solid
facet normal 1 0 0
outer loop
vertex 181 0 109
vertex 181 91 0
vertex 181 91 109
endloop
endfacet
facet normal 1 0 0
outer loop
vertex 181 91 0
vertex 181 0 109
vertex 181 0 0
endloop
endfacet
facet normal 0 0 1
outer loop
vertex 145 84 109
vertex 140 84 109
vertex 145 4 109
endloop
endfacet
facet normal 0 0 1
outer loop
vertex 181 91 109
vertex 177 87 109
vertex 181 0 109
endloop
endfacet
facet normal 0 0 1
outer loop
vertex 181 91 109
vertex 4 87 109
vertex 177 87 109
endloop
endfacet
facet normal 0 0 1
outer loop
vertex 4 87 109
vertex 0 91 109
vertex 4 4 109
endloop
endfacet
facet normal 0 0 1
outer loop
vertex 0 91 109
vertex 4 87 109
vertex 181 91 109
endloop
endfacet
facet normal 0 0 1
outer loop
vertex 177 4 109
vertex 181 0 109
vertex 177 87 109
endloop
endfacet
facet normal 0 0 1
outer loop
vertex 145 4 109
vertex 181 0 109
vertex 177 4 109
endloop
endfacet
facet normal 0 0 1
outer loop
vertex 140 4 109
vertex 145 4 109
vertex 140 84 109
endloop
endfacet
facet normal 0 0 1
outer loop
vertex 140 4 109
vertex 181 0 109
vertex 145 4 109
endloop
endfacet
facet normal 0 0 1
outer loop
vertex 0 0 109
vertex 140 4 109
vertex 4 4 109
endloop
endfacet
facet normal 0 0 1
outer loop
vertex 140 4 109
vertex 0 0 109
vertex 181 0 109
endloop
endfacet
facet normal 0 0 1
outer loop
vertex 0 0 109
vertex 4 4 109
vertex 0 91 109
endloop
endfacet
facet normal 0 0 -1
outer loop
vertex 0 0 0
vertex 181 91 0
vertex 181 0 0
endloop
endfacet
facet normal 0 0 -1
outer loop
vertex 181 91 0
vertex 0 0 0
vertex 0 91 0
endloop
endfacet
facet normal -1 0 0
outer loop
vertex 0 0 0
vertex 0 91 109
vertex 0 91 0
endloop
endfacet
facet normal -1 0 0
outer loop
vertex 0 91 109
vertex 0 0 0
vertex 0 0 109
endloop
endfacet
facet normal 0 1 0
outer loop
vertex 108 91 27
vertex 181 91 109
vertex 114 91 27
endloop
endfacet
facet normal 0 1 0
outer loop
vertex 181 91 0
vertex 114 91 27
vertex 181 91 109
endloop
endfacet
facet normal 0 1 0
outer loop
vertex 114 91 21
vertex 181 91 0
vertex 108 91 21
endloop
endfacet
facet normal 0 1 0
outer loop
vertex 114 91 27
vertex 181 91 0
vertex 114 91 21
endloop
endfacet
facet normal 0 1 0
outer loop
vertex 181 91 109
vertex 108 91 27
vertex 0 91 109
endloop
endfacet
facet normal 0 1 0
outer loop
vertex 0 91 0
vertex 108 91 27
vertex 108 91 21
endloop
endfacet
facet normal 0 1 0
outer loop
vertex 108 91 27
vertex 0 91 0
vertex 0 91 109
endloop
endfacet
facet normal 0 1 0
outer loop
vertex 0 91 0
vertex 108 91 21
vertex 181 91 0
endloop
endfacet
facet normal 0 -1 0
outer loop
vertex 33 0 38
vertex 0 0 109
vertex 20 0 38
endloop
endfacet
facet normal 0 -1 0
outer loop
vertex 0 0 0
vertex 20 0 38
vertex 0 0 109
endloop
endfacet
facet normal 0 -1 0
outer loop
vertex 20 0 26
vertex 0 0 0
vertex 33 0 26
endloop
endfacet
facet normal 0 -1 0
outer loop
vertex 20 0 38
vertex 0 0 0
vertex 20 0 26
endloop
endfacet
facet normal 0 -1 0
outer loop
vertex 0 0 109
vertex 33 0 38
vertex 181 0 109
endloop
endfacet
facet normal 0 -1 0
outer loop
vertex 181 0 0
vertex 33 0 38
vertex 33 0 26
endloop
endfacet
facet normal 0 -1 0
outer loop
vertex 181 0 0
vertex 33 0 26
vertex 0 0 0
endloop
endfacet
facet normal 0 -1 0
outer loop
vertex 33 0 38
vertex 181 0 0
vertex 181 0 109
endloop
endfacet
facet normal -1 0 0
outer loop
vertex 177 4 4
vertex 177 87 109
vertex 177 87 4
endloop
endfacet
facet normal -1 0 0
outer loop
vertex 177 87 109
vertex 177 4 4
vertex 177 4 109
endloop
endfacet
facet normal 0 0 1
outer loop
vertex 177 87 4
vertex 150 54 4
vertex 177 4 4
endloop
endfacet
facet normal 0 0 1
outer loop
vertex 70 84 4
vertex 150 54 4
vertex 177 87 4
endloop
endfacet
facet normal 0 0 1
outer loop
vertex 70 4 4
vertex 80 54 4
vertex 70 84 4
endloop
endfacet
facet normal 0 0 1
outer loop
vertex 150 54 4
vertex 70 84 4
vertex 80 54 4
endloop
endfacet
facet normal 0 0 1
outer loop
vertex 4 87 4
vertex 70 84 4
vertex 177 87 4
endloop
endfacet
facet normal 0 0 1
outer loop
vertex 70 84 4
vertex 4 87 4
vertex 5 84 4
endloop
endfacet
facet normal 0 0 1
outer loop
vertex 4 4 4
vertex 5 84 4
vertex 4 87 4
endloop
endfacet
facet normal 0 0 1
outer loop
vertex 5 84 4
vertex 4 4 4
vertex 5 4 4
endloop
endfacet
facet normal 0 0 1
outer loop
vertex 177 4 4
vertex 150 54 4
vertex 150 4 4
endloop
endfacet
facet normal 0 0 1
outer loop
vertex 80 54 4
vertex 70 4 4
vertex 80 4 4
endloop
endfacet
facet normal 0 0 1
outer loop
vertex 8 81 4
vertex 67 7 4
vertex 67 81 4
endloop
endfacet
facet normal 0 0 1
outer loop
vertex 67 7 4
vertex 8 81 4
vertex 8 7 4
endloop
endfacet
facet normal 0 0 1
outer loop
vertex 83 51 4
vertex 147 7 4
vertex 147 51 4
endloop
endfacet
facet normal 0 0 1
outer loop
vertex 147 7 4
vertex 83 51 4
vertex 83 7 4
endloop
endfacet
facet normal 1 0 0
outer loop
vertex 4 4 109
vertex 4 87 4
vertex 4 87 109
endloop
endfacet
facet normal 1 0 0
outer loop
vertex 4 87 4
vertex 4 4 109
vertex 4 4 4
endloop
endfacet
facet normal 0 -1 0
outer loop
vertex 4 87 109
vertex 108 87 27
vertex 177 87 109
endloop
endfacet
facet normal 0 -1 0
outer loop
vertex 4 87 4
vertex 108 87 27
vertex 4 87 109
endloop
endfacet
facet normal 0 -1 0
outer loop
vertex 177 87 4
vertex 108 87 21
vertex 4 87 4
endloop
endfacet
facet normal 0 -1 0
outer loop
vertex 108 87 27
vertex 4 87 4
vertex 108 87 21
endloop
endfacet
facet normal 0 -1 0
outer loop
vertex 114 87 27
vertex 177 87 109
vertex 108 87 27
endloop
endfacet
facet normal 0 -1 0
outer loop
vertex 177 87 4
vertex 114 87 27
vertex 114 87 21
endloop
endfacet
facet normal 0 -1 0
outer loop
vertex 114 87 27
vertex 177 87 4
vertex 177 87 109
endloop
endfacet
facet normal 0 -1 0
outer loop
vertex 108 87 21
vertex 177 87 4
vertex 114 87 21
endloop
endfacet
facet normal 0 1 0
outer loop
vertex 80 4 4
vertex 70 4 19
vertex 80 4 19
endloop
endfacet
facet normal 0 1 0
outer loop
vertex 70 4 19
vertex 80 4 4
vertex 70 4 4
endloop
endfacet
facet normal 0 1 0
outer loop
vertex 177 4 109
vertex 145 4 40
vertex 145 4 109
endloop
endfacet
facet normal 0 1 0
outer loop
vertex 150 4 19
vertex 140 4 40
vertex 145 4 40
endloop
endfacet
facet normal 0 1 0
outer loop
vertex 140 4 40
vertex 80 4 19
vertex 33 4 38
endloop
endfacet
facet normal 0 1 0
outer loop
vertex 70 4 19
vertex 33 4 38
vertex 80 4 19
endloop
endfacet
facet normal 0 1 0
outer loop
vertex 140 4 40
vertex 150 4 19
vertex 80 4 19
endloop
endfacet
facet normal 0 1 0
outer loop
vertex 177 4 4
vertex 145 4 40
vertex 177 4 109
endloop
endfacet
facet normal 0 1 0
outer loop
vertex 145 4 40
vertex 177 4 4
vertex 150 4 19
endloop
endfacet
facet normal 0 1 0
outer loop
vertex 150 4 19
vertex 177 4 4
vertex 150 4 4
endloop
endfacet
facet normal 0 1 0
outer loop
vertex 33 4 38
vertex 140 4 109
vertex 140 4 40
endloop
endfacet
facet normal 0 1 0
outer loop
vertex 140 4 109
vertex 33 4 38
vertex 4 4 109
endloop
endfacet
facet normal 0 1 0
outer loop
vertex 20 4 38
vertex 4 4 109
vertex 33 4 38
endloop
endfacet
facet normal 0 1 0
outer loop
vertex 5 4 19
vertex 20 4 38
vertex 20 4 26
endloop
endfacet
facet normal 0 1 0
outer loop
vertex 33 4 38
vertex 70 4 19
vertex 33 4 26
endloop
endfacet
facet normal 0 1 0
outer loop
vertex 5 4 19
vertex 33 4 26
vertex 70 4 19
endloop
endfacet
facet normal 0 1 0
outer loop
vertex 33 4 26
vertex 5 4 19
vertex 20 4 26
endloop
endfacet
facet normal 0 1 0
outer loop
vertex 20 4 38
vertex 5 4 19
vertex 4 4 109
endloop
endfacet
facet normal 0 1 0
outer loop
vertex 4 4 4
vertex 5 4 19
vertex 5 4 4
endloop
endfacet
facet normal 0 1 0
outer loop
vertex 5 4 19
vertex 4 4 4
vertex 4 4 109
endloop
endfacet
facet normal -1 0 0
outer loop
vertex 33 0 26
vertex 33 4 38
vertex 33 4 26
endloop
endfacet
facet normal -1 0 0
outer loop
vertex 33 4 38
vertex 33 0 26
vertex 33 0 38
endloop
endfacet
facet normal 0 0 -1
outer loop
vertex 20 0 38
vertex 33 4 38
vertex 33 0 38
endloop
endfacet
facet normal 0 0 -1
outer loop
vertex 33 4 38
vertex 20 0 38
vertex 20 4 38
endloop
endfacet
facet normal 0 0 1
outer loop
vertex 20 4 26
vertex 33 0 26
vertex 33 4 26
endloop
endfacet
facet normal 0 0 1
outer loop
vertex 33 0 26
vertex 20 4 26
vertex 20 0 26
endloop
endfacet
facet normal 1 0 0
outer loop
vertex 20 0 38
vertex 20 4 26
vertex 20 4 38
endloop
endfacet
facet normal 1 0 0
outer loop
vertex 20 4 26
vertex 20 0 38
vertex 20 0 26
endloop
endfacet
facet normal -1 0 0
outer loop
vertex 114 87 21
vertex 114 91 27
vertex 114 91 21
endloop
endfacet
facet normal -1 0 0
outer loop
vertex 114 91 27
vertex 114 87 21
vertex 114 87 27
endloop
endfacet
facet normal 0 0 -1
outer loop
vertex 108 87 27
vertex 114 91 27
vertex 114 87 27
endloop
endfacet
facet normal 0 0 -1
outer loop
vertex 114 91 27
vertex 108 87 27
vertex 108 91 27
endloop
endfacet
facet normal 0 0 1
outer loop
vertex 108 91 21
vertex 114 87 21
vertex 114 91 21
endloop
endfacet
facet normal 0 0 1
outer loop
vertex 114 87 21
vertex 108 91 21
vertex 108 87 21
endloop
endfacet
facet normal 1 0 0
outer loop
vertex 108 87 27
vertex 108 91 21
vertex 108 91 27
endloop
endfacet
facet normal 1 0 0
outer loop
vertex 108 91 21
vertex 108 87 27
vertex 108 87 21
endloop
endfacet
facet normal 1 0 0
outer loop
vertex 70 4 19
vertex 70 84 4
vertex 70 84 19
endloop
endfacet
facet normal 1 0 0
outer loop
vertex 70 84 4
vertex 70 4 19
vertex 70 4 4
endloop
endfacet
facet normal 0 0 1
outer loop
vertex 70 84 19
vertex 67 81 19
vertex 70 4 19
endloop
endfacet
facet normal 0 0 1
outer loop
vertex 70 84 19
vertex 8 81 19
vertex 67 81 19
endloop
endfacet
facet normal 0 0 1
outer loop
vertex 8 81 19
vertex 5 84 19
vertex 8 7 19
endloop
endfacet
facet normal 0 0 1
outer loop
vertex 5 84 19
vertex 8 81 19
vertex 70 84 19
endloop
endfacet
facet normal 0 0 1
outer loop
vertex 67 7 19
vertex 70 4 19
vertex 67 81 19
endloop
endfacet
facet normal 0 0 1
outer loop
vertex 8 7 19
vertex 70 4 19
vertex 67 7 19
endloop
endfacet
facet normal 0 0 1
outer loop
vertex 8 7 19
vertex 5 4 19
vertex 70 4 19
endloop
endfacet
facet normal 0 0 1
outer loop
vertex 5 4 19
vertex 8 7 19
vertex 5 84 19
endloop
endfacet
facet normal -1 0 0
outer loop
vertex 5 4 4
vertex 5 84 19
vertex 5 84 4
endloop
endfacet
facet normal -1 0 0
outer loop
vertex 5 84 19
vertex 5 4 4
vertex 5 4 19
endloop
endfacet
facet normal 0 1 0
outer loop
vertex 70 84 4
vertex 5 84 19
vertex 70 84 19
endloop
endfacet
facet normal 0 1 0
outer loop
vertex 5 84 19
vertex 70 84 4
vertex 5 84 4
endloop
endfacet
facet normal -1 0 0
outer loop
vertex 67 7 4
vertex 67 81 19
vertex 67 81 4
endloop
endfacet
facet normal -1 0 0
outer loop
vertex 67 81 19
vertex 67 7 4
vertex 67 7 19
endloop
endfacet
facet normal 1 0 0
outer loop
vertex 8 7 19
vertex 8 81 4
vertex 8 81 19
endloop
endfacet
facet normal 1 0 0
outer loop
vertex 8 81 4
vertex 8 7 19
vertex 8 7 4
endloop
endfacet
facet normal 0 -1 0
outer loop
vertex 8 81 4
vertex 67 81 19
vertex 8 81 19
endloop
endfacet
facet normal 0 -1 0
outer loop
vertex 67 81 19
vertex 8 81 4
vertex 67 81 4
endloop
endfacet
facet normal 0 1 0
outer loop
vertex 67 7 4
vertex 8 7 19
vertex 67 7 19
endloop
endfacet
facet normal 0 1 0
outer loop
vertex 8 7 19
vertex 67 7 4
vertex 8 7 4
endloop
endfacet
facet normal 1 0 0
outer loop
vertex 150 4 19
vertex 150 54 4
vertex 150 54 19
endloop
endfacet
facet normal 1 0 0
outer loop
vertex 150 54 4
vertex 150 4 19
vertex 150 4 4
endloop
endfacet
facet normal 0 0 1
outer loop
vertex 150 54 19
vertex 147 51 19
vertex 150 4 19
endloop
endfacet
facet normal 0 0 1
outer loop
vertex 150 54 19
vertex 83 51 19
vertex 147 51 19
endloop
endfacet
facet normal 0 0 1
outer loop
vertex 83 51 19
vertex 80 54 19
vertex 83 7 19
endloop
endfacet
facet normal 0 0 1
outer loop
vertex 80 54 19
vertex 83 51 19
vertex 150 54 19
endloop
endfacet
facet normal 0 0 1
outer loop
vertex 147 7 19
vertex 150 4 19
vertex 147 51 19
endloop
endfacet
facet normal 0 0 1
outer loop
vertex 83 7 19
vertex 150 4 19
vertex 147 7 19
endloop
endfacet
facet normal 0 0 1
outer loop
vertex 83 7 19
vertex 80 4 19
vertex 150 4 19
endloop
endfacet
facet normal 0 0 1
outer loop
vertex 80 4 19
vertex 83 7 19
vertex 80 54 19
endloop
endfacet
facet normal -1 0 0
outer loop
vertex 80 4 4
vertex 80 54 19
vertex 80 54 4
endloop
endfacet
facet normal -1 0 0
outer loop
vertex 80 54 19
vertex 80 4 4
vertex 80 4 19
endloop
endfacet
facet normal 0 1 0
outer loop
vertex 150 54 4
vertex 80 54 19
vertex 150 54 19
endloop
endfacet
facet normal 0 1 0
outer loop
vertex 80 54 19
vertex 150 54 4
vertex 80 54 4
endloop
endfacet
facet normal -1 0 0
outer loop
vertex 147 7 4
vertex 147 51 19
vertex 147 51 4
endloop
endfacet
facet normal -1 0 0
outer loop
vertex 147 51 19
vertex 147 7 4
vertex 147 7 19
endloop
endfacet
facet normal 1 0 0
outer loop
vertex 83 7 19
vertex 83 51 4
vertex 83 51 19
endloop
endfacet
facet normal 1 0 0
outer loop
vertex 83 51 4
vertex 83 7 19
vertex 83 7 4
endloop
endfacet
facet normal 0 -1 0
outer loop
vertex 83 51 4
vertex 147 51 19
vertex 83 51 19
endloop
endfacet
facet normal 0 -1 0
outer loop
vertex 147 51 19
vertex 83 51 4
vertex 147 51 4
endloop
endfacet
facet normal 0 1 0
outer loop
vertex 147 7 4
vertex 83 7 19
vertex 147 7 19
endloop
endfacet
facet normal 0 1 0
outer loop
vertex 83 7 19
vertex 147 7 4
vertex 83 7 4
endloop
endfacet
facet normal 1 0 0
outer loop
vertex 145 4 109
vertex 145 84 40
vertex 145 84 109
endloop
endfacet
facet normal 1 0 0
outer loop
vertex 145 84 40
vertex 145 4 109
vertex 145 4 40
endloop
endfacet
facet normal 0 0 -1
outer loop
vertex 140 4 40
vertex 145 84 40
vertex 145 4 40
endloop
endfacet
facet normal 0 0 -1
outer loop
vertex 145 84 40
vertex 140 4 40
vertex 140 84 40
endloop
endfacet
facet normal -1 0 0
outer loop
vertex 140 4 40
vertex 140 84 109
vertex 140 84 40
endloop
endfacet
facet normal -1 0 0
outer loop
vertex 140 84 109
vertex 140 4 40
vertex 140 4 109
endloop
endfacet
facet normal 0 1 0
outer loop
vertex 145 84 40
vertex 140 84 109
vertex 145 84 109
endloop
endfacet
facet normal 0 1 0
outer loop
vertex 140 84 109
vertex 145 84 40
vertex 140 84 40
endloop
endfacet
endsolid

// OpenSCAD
//below mentioned dimensions are in mm
union(){
    difference(){
        cube([181,91,109]);
        translate([4,4,4]){cube([173,83,105]);}
        translate([20,0,26]){cube([13,4,12]);}
        translate([108,87,21]){cube([6,4,6]);}}
        difference(){
            translate([5,4,4]){cube([65,80,15]);}
                translate([8,7,4]){cube([59,74,15]);}}
                difference(){
                    translate([80,4,4]){cube([70,50,15]);}
                    translate([83,7,4]){cube([64,44,15]);}}
                    translate([140,4,40]){cube([5,80,69]);}}
